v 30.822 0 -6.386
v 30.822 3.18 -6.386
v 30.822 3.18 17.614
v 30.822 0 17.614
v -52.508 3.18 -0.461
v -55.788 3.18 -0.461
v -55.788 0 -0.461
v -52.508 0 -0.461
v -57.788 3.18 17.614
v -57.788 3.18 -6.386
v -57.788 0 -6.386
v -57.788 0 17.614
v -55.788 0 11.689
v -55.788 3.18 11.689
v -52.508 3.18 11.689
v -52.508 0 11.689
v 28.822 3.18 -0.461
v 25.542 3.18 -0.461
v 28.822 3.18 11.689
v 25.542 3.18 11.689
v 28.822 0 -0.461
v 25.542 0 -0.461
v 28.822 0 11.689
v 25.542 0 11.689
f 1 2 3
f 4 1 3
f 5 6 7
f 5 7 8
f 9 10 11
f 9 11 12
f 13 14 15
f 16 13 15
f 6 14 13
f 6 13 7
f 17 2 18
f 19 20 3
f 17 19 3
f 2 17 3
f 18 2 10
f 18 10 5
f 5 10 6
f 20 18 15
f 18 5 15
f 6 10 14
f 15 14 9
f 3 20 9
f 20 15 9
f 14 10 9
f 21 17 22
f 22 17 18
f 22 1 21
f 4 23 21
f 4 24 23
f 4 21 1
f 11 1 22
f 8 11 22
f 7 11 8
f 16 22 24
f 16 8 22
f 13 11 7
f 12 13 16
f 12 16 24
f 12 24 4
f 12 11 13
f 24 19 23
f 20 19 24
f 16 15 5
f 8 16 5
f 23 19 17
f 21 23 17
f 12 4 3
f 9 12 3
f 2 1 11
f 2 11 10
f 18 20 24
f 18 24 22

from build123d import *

# Parameters (mm, degrees)
SKETCH1_W           = 84.61
SKETCH1_H           = 24
BOSS_EXTRUDE1_DEPTH = 3.18
SKETCH10_W          = 24
SKETCH10_H          = 3.18
BOSS_EXTRUDE2_DEPTH = 2
SKETCH9_W           = 3.28
SKETCH9_H           = 12.15
CUT_EXTRUDE1_DEPTH  = 61.496753834


with BuildPart() as part:
    # Sketch1 → Boss-Extrude1 (new body)
    with BuildSketch(Plane(origin=(0, 0, 0), x_dir=(1, 0, 0), z_dir=(0, 1, 0))):
        with Locations((-13.483376754, -5.613867735)):
            Rectangle(SKETCH1_W, SKETCH1_H)
    extrude(amount=BOSS_EXTRUDE1_DEPTH)

    # Sketch10 → Boss-Extrude2 (add)
    with BuildSketch(Plane.ZY.offset(55.788376754)):
        with Locations((5.613867735, 1.59)):
            Rectangle(SKETCH10_W, SKETCH10_H)
    boss_extrude2 = extrude(amount=BOSS_EXTRUDE2_DEPTH)

    # Sketch9 → Cut-Extrude1 (cut, through all)
    with BuildSketch(Plane(origin=(0, 3.18, 0), x_dir=(1, 0, 0), z_dir=(0, 1, 0))):
        with Locations((-54.148376754, -5.613867735)):
            Rectangle(SKETCH9_W, SKETCH9_H)
    cut_extrude1 = extrude(amount=-CUT_EXTRUDE1_DEPTH, mode=Mode.SUBTRACT)

    # Mirror1: Boss-Extrude2, Cut-Extrude1 across plane
    add(boss_extrude2.mirror(Plane.ZY.offset(13.483376754)))
    add(cut_extrude1.mirror(Plane.ZY.offset(13.483376754)), mode=Mode.SUBTRACT)


solid = part.part
